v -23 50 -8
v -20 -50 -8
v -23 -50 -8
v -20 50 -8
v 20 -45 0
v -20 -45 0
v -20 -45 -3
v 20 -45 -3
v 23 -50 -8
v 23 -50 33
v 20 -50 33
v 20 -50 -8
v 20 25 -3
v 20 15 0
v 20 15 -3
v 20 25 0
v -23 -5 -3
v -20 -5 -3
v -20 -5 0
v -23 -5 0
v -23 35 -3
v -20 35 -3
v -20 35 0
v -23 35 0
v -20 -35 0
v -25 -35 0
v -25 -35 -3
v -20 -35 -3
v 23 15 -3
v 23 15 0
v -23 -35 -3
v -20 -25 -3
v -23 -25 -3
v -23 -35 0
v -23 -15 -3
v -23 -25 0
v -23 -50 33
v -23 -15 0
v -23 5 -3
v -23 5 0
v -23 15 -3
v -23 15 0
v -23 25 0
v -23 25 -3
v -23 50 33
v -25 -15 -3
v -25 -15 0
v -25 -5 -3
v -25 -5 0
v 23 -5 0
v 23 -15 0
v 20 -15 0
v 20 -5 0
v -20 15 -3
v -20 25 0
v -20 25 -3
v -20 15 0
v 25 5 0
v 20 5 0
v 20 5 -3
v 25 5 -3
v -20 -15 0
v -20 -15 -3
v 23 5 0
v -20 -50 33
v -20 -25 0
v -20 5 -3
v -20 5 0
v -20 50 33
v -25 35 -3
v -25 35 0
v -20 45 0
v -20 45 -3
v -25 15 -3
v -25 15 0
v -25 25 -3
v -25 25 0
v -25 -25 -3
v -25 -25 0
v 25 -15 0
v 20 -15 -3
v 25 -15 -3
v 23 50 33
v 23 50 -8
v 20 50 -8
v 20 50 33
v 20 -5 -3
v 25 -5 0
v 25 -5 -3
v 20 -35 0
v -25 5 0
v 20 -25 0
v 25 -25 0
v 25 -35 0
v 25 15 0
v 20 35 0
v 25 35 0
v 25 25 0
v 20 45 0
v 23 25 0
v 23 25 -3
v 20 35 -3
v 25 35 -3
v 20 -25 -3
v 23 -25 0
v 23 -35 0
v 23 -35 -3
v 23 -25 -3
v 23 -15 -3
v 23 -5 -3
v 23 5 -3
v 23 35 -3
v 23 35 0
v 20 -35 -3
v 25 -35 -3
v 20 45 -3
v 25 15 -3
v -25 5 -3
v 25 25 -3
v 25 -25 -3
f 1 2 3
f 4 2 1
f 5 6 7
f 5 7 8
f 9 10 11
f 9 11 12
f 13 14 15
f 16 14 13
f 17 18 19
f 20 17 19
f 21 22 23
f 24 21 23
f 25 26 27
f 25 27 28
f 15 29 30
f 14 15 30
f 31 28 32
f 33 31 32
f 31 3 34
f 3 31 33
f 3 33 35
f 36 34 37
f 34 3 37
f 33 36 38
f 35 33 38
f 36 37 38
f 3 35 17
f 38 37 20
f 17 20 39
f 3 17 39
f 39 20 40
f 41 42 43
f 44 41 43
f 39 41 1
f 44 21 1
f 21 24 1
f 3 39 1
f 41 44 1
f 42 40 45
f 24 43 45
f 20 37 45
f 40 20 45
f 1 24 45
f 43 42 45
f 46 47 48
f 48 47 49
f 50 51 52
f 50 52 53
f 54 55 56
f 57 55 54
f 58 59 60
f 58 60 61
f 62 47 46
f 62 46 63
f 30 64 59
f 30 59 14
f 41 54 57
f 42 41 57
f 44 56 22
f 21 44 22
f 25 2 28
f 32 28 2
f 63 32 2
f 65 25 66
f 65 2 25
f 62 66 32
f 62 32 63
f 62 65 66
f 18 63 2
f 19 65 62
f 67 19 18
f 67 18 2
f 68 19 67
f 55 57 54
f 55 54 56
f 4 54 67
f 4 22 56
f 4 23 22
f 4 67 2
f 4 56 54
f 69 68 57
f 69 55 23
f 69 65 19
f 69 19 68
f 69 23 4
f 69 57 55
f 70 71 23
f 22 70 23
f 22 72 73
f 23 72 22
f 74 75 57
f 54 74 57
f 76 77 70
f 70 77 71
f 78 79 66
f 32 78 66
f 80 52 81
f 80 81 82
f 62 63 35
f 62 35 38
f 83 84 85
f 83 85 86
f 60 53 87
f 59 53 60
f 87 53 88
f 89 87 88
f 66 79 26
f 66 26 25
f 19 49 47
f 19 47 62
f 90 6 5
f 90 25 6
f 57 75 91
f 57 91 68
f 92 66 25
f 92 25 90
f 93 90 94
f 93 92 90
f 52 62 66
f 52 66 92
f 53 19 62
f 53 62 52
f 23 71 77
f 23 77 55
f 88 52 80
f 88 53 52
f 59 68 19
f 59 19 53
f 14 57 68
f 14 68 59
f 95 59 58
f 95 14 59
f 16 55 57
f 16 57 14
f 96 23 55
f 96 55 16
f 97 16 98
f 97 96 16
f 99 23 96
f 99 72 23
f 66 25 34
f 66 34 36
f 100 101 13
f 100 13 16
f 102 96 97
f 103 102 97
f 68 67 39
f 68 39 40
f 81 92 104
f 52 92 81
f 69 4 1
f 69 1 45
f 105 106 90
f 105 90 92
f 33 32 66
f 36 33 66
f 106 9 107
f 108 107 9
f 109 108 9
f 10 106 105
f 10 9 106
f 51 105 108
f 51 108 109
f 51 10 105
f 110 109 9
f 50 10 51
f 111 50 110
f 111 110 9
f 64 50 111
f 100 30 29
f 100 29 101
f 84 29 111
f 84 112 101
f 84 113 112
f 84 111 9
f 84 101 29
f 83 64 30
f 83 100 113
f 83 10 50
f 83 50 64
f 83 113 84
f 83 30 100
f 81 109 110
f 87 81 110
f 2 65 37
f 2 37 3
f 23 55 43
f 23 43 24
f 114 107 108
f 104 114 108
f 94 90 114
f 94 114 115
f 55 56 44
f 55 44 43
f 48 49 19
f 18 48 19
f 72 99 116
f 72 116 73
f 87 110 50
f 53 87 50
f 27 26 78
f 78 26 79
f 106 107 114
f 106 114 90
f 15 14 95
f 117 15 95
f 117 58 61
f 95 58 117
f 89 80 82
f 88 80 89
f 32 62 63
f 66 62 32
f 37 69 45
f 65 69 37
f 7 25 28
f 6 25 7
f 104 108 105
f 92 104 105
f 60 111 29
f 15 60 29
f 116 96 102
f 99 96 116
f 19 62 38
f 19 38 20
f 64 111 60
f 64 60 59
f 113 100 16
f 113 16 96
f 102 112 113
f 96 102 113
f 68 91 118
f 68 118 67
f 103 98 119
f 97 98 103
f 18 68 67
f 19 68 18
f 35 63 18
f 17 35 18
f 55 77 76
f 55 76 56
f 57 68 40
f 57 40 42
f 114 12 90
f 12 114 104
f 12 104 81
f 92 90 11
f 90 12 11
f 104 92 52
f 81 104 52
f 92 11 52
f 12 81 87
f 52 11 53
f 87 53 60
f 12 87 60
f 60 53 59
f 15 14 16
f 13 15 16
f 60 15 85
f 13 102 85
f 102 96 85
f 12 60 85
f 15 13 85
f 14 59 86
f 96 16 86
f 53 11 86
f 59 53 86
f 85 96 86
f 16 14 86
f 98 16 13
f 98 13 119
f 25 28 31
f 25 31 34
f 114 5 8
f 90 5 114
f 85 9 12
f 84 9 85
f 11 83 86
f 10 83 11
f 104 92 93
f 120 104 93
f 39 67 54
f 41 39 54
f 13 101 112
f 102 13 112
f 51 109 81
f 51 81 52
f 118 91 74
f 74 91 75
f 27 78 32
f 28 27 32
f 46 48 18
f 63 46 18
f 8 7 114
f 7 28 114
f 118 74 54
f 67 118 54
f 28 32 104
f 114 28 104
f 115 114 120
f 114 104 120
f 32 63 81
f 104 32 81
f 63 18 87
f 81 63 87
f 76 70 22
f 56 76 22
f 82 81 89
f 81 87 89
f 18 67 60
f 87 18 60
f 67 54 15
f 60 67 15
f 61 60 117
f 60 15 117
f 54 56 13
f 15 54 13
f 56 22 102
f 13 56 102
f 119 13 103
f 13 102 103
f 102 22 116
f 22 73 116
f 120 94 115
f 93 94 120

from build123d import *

# Parameters (mm, degrees)
F2_W     = 5
F2_H     = 10
F3_DEPTH = 3
F4_W     = 10
F4_H     = 3
F5_DEPTH = 23
F6_DEPTH = 20


with BuildPart() as f3:
    # F2 (on Top) → F3 (new body)
    with BuildSketch(Plane.XY):
        Polygon((-20, -45), (20, -45), (20, -35), (20, -25), (20, -15), (20, -5), (20, 5), (20, 15), (20, 25), (20, 35), (20, 45), (-20, 45), (-20, 35), (-20, 25), (-20, 15), (-20, 5), (-20, -5), (-20, -15), (-20, -25), (-20, -35), align=None)
        with Locations((-22.5, 10)):
            Rectangle(F2_W, F2_H)
        with Locations((-22.5, -10)):
            Rectangle(F2_W, F2_H)
        with Locations((-22.5, -30)):
            Rectangle(F2_W, F2_H)
        with Locations((-22.5, 30)):
            Rectangle(F2_W, F2_H)
        with Locations((22.5, 30)):
            Rectangle(F2_W, F2_H)
        with Locations((22.5, 10)):
            Rectangle(F2_W, F2_H)
        with Locations((22.5, -10)):
            Rectangle(F2_W, F2_H)
        with Locations((22.5, -30)):
            Rectangle(F2_W, F2_H)
    extrude(amount=-F3_DEPTH)


with BuildPart() as f5:
    # F4 (on Right) → F5 (new body, symmetric)
    with BuildSketch(Plane.YZ):
        Polygon((50, -8), (50, 0), (50, 33), (-50, 33), (-50, -8), align=None)
        with Locations((-30, -1.5)):
            Rectangle(F4_W, F4_H, mode=Mode.SUBTRACT)
        with Locations((-10, -1.5)):
            Rectangle(F4_W, F4_H, mode=Mode.SUBTRACT)
        with Locations((10, -1.5)):
            Rectangle(F4_W, F4_H, mode=Mode.SUBTRACT)
        with Locations((30, -1.5)):
            Rectangle(F4_W, F4_H, mode=Mode.SUBTRACT)
    extrude(amount=F5_DEPTH, both=True)

    # F4 (on Right) → F6 (cut, symmetric)
    with BuildSketch(Plane.YZ):
        Polygon((50, -8), (50, 0), (50, 33), (-50, 33), (-50, -8), align=None)
        with Locations((-30, -1.5)):
            Rectangle(F4_W, F4_H, mode=Mode.SUBTRACT)
        with Locations((-10, -1.5)):
            Rectangle(F4_W, F4_H, mode=Mode.SUBTRACT)
        with Locations((10, -1.5)):
            Rectangle(F4_W, F4_H, mode=Mode.SUBTRACT)
        with Locations((30, -1.5)):
            Rectangle(F4_W, F4_H, mode=Mode.SUBTRACT)
    extrude(amount=F6_DEPTH, both=True, mode=Mode.SUBTRACT)


solid = Compound([f3.part, f5.part])
